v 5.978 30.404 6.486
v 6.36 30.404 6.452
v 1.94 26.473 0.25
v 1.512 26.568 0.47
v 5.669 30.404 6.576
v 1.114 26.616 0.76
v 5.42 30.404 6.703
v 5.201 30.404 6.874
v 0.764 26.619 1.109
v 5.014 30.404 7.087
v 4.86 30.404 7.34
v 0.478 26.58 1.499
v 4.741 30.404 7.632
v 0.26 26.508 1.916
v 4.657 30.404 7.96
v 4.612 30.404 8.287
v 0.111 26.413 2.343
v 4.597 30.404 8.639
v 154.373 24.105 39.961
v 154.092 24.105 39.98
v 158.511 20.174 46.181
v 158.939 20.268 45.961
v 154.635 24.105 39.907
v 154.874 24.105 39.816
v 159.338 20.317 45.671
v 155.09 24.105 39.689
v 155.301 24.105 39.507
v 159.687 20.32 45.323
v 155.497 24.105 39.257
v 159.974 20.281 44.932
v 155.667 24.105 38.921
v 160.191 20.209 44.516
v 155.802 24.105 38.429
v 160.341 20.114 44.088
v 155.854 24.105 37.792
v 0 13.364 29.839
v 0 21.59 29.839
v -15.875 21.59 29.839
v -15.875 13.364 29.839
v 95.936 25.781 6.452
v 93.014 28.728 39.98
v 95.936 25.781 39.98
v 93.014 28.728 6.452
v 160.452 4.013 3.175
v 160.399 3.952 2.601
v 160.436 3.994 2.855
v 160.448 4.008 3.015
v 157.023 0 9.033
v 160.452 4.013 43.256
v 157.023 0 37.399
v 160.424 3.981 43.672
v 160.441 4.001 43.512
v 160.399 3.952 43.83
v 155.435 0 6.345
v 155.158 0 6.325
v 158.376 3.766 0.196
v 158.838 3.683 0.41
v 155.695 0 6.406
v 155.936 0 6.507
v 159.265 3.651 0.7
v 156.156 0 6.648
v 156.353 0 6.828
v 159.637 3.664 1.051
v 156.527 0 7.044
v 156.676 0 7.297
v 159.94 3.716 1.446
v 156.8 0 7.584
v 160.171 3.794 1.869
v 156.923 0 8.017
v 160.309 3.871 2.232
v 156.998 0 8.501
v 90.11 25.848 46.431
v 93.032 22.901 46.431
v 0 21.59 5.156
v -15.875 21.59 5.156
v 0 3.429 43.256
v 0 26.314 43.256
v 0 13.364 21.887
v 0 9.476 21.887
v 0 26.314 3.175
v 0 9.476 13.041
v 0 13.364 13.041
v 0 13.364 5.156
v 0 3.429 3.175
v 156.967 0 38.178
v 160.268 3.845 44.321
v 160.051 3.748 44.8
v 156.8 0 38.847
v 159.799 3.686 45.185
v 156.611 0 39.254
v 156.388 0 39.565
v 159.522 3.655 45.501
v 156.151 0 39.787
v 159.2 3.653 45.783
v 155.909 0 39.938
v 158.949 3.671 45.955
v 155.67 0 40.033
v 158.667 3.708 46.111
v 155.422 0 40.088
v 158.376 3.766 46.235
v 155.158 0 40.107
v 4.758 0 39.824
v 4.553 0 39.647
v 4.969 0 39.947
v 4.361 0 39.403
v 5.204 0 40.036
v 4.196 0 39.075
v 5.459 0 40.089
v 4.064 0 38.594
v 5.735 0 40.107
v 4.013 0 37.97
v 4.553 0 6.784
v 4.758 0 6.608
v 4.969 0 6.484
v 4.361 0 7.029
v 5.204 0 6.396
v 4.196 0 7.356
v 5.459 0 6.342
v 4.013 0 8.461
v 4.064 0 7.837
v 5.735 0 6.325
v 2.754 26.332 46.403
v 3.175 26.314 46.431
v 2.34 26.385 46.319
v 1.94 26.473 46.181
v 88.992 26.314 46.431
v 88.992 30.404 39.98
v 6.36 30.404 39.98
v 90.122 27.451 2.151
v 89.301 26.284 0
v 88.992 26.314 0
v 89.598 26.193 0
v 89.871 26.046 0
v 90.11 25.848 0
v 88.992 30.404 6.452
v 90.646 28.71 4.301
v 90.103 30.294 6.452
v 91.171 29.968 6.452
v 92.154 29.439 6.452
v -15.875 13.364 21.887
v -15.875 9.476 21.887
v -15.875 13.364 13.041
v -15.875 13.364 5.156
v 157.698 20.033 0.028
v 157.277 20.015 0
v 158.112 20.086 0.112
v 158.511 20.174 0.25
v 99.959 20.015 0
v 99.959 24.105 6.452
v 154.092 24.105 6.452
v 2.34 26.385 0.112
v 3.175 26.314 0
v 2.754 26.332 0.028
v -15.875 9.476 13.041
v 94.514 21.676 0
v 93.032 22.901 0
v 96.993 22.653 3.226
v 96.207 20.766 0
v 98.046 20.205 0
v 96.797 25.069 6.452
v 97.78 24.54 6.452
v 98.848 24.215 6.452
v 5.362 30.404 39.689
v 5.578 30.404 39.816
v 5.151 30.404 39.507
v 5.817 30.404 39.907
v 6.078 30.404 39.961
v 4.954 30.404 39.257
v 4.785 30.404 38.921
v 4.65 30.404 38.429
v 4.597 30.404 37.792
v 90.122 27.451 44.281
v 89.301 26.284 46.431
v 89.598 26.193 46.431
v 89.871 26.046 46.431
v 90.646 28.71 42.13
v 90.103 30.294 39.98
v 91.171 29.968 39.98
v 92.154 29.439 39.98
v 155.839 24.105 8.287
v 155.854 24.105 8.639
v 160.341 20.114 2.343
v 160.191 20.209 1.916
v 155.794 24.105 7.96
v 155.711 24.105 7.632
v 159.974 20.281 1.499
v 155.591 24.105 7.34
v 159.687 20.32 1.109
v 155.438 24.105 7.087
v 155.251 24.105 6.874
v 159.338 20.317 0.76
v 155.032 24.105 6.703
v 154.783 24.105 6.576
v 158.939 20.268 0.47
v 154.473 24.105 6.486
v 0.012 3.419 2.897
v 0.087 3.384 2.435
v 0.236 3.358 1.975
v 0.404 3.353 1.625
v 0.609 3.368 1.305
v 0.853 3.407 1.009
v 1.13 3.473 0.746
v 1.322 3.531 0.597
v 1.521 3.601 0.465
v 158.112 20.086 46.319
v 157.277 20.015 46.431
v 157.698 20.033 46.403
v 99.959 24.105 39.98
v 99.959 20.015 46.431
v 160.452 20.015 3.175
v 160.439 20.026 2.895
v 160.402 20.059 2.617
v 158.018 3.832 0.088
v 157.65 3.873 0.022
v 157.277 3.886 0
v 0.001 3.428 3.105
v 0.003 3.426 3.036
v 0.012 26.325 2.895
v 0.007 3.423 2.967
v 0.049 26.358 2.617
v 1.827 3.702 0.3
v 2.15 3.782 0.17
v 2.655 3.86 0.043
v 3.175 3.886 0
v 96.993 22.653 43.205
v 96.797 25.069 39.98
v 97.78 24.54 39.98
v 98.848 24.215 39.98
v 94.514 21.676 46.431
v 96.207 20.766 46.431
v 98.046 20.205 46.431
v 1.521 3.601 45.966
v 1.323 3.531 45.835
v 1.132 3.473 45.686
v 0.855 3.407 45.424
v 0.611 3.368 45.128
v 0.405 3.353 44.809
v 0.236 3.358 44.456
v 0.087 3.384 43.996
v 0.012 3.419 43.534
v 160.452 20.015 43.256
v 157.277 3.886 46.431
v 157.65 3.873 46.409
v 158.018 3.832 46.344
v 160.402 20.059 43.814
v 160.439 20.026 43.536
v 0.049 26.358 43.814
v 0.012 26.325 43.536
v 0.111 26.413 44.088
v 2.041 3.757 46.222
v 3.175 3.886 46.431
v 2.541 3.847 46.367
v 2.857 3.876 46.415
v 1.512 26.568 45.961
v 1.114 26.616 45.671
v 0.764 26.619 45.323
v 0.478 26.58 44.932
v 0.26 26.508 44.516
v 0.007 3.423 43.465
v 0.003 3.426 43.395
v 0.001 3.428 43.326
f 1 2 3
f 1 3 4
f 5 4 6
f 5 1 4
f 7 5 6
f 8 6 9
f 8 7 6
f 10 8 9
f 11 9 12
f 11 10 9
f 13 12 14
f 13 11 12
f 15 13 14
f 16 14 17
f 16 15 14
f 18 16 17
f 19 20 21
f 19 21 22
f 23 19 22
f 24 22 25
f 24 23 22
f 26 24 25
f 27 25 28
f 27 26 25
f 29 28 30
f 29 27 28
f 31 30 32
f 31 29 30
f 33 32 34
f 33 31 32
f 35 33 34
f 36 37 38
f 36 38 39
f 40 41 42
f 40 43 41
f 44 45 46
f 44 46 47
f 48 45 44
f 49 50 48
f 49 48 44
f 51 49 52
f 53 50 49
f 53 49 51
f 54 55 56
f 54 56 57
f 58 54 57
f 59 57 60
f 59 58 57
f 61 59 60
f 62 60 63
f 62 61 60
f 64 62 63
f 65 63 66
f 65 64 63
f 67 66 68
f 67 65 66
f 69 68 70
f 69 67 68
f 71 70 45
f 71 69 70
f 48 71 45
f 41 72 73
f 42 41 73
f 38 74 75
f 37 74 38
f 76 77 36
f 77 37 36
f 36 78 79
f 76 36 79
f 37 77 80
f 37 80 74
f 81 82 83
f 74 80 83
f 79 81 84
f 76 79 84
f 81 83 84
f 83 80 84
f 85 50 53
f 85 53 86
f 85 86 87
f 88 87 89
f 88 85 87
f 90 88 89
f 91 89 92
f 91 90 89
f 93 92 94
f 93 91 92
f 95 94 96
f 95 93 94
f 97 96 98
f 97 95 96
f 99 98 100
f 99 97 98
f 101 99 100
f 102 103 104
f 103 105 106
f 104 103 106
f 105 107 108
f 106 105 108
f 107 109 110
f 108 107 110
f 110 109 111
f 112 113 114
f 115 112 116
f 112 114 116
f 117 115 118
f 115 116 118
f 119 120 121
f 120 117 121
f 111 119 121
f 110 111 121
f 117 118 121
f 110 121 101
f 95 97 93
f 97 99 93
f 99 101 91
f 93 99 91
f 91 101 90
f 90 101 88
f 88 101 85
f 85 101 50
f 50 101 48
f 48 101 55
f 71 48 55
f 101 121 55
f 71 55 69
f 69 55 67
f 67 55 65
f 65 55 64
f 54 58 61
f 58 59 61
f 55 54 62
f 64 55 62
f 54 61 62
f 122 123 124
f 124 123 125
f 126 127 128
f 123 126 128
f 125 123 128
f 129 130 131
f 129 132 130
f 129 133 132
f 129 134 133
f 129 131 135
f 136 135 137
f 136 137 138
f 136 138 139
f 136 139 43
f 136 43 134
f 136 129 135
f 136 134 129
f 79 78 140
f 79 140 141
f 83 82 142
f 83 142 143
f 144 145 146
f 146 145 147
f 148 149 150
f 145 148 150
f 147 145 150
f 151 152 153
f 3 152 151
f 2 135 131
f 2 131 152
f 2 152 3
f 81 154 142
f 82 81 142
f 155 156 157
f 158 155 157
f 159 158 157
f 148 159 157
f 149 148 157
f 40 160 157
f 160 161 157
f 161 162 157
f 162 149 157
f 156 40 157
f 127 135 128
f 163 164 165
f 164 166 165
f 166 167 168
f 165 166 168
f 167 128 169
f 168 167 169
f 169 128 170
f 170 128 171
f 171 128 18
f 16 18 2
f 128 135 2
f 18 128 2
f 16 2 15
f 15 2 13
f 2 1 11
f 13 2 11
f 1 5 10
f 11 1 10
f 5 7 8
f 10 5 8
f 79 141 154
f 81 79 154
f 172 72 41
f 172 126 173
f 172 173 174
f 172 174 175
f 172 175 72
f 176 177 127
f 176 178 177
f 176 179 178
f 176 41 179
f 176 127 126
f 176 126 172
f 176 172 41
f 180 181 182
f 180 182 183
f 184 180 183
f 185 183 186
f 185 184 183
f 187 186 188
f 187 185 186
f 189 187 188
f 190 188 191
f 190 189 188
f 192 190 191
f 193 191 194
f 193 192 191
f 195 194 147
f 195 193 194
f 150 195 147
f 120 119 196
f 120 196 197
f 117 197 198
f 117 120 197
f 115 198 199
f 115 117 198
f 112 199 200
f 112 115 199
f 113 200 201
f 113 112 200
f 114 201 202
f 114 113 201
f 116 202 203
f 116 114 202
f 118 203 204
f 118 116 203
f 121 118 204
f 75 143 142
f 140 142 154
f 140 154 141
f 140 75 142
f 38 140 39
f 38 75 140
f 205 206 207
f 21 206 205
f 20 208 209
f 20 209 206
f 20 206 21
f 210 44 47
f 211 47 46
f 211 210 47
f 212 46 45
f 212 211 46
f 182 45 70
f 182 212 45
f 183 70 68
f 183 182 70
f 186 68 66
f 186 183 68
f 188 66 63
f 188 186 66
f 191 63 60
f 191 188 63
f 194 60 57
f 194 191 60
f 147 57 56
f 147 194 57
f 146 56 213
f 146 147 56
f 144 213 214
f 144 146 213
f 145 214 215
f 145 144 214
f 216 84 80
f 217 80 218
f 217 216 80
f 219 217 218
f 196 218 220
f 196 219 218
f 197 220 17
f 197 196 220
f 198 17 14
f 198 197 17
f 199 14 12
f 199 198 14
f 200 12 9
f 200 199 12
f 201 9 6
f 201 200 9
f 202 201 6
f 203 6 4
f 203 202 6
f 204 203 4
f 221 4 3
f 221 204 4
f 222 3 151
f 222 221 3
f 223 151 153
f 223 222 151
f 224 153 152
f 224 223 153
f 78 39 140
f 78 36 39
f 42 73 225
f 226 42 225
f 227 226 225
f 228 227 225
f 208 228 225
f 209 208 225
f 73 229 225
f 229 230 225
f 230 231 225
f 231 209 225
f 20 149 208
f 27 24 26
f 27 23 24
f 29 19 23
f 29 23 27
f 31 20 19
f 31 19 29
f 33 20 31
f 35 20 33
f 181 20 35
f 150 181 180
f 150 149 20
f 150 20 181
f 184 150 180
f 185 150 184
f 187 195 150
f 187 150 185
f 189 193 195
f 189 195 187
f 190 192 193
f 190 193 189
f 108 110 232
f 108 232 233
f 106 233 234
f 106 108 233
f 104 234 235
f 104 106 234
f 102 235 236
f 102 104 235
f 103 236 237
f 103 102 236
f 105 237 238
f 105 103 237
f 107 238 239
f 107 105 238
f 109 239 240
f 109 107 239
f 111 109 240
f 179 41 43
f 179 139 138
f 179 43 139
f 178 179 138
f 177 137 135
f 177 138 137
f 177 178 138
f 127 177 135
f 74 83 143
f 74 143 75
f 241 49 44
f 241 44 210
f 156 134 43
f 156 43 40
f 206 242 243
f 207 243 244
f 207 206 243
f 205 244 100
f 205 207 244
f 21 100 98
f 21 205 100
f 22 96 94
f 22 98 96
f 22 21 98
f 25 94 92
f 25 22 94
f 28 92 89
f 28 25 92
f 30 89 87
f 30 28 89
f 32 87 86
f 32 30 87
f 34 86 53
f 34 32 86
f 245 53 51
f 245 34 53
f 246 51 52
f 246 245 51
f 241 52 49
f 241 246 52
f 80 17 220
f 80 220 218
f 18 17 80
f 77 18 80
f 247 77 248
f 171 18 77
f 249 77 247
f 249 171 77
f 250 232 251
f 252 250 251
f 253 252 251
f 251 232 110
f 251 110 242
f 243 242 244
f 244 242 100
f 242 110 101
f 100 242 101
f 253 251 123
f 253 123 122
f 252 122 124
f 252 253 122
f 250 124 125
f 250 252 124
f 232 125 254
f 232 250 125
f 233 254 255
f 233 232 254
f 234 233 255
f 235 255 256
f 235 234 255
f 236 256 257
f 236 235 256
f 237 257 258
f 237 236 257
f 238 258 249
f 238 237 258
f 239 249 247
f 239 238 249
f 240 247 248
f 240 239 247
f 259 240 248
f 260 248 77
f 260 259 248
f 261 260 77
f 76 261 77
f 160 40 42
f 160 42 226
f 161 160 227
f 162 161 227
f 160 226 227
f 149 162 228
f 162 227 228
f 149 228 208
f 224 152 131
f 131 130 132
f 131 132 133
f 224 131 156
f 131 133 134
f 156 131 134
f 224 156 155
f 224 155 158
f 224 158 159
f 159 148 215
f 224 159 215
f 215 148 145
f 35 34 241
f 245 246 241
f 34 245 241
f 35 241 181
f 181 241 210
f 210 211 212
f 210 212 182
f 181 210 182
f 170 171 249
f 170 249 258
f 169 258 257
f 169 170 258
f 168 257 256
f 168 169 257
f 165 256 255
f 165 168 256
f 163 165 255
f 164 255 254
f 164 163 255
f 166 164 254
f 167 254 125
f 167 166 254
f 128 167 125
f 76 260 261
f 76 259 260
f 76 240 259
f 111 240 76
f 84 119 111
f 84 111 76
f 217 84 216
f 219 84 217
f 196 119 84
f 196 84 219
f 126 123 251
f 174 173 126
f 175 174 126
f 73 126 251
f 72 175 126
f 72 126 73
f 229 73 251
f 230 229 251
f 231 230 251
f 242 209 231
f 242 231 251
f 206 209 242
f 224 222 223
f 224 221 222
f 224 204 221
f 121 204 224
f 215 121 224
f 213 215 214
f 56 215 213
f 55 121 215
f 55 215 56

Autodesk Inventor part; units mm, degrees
ref_plane "YZ Plane" through (0, 0, 0) normal (1, 0, 0) x (0, 1, 0)
ref_plane "XZ Plane" through (0, 0, 0) normal (0, 1, 0) x (-1, 0, 0)
ref_plane "XY Plane" through (0, 0, 0) normal (0, 0, 1) x (1, 0, 0)
sketch "Sketch1" plane through (0, 0, 0) normal (0, 0, 1) x (1, 0, 0)
  line L0 (0, 0) -> (160.4518, 0)
  line L1 (160.4518, 0) -> (160.4518, 30.4038)
  line L2 (160.4518, 30.4038) -> (0, 30.4038)
  line L3 (0, 30.4038) -> (0, 0)
  line L4 (97.5982, 24.1046) -> (160.4518, 24.1046)
  line L5 (95.9612, 25.7556) -> (92.9894, 28.7528) construction
  line L6 (91.3524, 30.4038) -> (97.5982, 24.1046)
  dimension "d0" = 160.4518
  dimension "d1" = 30.4038
  dimension "d4" = 67.4624
  dimension "d5" = 1.651
  dimension "d8" = 64.4906
  dimension "d9" = 4.6482
  dimension "d10" = 6.2992
extrude "Extrusion1" add sketch "Sketch1" along normal blind 46.4312 contours L3 L2 L6 L4 L1 L0
fillet "Fillet1" radius 5.6642 2 edges at (91.3524, 30.4038, 23.2156) (97.5982, 24.1046, 23.2156)
chamfer "Chamfer1" distance 4.5974 distance2 4.0894 1 edges at (160.4518, 24.1046, 23.2156) measured on face at (140.2874, 24.1046, 15.4771)
chamfer "Chamfer3" distance 4.0894 distance2 6.4516 3 edges at (127.9065, 24.1046, 0) (94.4753, 27.2542, 0) (44.496, 30.4038, 0) measured on face at (86.4331, 8.0715, 0)
chamfer "Chamfer2" distance 4.0894 distance2 6.4516 3 edges at (127.9065, 24.1046, 46.4312) (94.4753, 27.2542, 46.4312) (44.496, 30.4038, 46.4312) measured on face at (86.4331, 8.0715, 46.4312)
chamfer "Chamfer4" distance 4.0894 distance2 4.5974 1 edges at (0, 30.4038, 23.2156) measured on face at (0, 10.1346, 28.8036)
chamfer "Chamfer5" distance 3.429 distance2 4.0132 1 edges at (0, 0, 23.2156) measured on face at (0, 17.5429, 30.9541)
chamfer "Chamfer6" distance 3.8862 distance2 6.3246 1 edges at (82.2325, 0, 46.4312) measured on face at (87.5035, 6.7349, 46.4312)
chamfer "Chamfer7" distance 4.0132 distance2 3.429 1 edges at (160.4518, 0, 20.0533) measured on face at (160.4518, 13.3435, 28.8459)
chamfer "Chamfer8" distance 3.8862 distance2 6.3246 1 edges at (80.518, 0, 0) measured on face at (86.3605, 6.7349, 0)
fillet "Fillet2" radius 3.175 12 edges at (0, 15.1003, 0) (2.2987, 28.3591, 3.2258) (0, 15.1003, 46.4312) (2.2987, 28.3591, 43.2054) (2.0066, 1.7145, 3.5343) (2.0066, 1.7145, 42.8969) (158.683, 1.9431, 3.1623) (160.4518, 12.0142, 0) (158.1531, 22.0599, 3.2258) (158.1531, 22.0599, 43.2054) (160.4518, 12.0142, 46.4312) (158.683, 1.9431, 43.2689)
sketch "Sketch2" plane through (0, 3.429, 43.2562) normal (-1, 0, 0) x (0, 0, 1)
  line L0 (-32.0153, 0.1) -> (-56.6979, 0.1) construction
  line L1 (-56.6979, 0.1) -> (-56.6979, 8.3256) construction
  line L2 (-56.6979, 8.3256) -> (-32.0153, 8.3256) construction
  line L3 (-32.0153, 8.3256) -> (-32.0153, 0.1) construction
  ellipse E0 centre (-40.1387, 8.5022) end of major axis (-39.8909, 8.2522) minor radius 0.0031 (-40.1387, 8.4978) -> (-39.8909, 8.2522) ccw construction
  line L4 (-48.8131, 12.2136) -> (-39.9668, 12.2136) construction
  line L5 (-39.9668, 12.2136) -> (-39.9668, 8.3256) construction
  line L6 (-39.9668, 8.3256) -> (-48.8131, 8.3256) construction
  line L7 (-48.8131, 8.3256) -> (-48.8131, 12.2136) construction
  line L8 (-38.1, 18.161) -> (-13.4174, 18.161)
  line L9 (-13.4174, 18.161) -> (-13.4174, 9.9354)
  line L10 (-13.4174, 9.9354) -> (-38.1, 9.9354)
  line L11 (-38.1, 9.9354) -> (-38.1, 18.161)
  line L12 (-30.2152, 9.9354) -> (-21.3689, 9.9354)
  line L13 (-21.3689, 9.9354) -> (-21.3689, 6.0474)
  line L14 (-21.3689, 6.0474) -> (-30.2152, 6.0474)
  line L15 (-30.2152, 6.0474) -> (-30.2152, 9.9354)
  line L16 (-5.4645, 26.9748) -> (-34.6167, 26.9748) projected
  line L17 (-43.2562, 22.8854) -> (-43.2562, 0.4572) projected
  point P0 (-43.2562, -3.429)
  point P1 (-21.3689, 9.9354)
  dimension "d40" = 8.8464
  dimension "d41" = 8.2256
  dimension "d42" = 24.6826
  dimension "d43" = 3.888
  dimension "d44" = 7.8848
  dimension "d45" = 8.2256
  dimension "d46" = 24.6826
  dimension "d47" = 7.8848
  dimension "d48" = 3.888
  dimension "d49" = 8.8464
  dimension "d50" = 7.9515
  dimension "d51" = 7.9515
  dimension "d52" = 8.8138
  dimension "d53" = 5.1562
extrude "Extrusion2" add sketch "Sketch2" along normal blind 15.875
equation "\"d45\" = d41"
equation "\"d46\" = d42"
equation "\"d47\" = d44"
equation "\"d48\" = d43"
equation "\"d49\" = d40"
properties part number "V5 Simple Battery"
